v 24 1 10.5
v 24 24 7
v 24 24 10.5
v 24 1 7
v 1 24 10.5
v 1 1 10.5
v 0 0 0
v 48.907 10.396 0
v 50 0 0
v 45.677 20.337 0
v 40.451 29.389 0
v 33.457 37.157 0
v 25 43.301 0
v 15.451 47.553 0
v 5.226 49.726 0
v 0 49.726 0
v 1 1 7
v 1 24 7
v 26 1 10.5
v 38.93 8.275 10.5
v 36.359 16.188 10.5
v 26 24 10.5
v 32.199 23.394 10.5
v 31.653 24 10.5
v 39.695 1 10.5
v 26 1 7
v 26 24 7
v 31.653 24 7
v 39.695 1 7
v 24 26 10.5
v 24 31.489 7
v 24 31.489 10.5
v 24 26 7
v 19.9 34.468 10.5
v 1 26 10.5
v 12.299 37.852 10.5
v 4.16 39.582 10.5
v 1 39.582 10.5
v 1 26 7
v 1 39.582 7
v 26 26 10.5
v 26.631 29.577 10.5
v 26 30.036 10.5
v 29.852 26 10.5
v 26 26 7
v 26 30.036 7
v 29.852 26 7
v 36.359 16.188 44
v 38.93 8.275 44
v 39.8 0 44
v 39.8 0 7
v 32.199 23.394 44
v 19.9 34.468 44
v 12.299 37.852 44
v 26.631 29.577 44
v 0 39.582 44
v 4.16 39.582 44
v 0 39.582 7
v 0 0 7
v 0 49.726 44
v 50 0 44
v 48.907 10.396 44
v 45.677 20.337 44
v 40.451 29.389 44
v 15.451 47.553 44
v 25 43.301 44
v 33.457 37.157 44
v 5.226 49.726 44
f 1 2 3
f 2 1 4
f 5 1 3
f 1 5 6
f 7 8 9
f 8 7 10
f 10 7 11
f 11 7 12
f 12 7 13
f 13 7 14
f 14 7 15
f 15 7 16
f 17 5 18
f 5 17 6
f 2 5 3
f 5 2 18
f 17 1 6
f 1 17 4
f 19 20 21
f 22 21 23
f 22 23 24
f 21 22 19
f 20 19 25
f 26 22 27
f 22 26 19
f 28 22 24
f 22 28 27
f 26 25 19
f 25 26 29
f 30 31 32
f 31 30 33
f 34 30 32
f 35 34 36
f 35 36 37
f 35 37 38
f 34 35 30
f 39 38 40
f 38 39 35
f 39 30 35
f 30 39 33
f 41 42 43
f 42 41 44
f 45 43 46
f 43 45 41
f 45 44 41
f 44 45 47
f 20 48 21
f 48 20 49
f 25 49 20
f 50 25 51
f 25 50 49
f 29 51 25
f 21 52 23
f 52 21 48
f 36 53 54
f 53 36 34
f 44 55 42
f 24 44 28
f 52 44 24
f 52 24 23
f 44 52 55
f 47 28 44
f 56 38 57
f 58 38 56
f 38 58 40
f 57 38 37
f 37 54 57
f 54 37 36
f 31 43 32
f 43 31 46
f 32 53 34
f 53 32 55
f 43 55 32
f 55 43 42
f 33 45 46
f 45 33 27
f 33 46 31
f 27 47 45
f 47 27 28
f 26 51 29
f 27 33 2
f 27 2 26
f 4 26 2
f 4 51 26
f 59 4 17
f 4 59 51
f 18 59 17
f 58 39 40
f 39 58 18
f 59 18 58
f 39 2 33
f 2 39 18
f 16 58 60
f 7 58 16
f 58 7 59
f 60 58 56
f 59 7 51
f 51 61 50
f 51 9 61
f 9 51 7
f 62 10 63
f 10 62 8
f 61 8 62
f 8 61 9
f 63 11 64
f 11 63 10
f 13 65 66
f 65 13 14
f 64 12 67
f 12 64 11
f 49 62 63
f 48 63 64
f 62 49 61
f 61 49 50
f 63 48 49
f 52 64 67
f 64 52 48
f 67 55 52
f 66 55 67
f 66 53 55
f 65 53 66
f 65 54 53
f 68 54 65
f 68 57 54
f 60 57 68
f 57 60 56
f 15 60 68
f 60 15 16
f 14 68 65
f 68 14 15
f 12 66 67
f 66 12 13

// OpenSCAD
color("LightGray") {
    intersection () {
        union() {
            translate([1,1,0]) cube([23,23,6+4.5]);
            translate([25+1,1,0]) cube([23,23,6+4.5]);
            translate([1,25+1,0]) cube([23,23,6+4.5]);
            translate([25+1,25+1,0]) cube([23,23,6+4.5]);
        }
        cylinder(50,50-10.2,50-10.2);
    }
}
color("Grey") {
    intersection() {
        cube([50,50,7]);
        cylinder(50,50-10.2,50-10.2);
    }
    intersection() {
        difference() {
            cylinder(50-6,50,50);
            cylinder(50,50-10.2,50-10.2);
        }
        cube([50,50,50]);
    }
}
